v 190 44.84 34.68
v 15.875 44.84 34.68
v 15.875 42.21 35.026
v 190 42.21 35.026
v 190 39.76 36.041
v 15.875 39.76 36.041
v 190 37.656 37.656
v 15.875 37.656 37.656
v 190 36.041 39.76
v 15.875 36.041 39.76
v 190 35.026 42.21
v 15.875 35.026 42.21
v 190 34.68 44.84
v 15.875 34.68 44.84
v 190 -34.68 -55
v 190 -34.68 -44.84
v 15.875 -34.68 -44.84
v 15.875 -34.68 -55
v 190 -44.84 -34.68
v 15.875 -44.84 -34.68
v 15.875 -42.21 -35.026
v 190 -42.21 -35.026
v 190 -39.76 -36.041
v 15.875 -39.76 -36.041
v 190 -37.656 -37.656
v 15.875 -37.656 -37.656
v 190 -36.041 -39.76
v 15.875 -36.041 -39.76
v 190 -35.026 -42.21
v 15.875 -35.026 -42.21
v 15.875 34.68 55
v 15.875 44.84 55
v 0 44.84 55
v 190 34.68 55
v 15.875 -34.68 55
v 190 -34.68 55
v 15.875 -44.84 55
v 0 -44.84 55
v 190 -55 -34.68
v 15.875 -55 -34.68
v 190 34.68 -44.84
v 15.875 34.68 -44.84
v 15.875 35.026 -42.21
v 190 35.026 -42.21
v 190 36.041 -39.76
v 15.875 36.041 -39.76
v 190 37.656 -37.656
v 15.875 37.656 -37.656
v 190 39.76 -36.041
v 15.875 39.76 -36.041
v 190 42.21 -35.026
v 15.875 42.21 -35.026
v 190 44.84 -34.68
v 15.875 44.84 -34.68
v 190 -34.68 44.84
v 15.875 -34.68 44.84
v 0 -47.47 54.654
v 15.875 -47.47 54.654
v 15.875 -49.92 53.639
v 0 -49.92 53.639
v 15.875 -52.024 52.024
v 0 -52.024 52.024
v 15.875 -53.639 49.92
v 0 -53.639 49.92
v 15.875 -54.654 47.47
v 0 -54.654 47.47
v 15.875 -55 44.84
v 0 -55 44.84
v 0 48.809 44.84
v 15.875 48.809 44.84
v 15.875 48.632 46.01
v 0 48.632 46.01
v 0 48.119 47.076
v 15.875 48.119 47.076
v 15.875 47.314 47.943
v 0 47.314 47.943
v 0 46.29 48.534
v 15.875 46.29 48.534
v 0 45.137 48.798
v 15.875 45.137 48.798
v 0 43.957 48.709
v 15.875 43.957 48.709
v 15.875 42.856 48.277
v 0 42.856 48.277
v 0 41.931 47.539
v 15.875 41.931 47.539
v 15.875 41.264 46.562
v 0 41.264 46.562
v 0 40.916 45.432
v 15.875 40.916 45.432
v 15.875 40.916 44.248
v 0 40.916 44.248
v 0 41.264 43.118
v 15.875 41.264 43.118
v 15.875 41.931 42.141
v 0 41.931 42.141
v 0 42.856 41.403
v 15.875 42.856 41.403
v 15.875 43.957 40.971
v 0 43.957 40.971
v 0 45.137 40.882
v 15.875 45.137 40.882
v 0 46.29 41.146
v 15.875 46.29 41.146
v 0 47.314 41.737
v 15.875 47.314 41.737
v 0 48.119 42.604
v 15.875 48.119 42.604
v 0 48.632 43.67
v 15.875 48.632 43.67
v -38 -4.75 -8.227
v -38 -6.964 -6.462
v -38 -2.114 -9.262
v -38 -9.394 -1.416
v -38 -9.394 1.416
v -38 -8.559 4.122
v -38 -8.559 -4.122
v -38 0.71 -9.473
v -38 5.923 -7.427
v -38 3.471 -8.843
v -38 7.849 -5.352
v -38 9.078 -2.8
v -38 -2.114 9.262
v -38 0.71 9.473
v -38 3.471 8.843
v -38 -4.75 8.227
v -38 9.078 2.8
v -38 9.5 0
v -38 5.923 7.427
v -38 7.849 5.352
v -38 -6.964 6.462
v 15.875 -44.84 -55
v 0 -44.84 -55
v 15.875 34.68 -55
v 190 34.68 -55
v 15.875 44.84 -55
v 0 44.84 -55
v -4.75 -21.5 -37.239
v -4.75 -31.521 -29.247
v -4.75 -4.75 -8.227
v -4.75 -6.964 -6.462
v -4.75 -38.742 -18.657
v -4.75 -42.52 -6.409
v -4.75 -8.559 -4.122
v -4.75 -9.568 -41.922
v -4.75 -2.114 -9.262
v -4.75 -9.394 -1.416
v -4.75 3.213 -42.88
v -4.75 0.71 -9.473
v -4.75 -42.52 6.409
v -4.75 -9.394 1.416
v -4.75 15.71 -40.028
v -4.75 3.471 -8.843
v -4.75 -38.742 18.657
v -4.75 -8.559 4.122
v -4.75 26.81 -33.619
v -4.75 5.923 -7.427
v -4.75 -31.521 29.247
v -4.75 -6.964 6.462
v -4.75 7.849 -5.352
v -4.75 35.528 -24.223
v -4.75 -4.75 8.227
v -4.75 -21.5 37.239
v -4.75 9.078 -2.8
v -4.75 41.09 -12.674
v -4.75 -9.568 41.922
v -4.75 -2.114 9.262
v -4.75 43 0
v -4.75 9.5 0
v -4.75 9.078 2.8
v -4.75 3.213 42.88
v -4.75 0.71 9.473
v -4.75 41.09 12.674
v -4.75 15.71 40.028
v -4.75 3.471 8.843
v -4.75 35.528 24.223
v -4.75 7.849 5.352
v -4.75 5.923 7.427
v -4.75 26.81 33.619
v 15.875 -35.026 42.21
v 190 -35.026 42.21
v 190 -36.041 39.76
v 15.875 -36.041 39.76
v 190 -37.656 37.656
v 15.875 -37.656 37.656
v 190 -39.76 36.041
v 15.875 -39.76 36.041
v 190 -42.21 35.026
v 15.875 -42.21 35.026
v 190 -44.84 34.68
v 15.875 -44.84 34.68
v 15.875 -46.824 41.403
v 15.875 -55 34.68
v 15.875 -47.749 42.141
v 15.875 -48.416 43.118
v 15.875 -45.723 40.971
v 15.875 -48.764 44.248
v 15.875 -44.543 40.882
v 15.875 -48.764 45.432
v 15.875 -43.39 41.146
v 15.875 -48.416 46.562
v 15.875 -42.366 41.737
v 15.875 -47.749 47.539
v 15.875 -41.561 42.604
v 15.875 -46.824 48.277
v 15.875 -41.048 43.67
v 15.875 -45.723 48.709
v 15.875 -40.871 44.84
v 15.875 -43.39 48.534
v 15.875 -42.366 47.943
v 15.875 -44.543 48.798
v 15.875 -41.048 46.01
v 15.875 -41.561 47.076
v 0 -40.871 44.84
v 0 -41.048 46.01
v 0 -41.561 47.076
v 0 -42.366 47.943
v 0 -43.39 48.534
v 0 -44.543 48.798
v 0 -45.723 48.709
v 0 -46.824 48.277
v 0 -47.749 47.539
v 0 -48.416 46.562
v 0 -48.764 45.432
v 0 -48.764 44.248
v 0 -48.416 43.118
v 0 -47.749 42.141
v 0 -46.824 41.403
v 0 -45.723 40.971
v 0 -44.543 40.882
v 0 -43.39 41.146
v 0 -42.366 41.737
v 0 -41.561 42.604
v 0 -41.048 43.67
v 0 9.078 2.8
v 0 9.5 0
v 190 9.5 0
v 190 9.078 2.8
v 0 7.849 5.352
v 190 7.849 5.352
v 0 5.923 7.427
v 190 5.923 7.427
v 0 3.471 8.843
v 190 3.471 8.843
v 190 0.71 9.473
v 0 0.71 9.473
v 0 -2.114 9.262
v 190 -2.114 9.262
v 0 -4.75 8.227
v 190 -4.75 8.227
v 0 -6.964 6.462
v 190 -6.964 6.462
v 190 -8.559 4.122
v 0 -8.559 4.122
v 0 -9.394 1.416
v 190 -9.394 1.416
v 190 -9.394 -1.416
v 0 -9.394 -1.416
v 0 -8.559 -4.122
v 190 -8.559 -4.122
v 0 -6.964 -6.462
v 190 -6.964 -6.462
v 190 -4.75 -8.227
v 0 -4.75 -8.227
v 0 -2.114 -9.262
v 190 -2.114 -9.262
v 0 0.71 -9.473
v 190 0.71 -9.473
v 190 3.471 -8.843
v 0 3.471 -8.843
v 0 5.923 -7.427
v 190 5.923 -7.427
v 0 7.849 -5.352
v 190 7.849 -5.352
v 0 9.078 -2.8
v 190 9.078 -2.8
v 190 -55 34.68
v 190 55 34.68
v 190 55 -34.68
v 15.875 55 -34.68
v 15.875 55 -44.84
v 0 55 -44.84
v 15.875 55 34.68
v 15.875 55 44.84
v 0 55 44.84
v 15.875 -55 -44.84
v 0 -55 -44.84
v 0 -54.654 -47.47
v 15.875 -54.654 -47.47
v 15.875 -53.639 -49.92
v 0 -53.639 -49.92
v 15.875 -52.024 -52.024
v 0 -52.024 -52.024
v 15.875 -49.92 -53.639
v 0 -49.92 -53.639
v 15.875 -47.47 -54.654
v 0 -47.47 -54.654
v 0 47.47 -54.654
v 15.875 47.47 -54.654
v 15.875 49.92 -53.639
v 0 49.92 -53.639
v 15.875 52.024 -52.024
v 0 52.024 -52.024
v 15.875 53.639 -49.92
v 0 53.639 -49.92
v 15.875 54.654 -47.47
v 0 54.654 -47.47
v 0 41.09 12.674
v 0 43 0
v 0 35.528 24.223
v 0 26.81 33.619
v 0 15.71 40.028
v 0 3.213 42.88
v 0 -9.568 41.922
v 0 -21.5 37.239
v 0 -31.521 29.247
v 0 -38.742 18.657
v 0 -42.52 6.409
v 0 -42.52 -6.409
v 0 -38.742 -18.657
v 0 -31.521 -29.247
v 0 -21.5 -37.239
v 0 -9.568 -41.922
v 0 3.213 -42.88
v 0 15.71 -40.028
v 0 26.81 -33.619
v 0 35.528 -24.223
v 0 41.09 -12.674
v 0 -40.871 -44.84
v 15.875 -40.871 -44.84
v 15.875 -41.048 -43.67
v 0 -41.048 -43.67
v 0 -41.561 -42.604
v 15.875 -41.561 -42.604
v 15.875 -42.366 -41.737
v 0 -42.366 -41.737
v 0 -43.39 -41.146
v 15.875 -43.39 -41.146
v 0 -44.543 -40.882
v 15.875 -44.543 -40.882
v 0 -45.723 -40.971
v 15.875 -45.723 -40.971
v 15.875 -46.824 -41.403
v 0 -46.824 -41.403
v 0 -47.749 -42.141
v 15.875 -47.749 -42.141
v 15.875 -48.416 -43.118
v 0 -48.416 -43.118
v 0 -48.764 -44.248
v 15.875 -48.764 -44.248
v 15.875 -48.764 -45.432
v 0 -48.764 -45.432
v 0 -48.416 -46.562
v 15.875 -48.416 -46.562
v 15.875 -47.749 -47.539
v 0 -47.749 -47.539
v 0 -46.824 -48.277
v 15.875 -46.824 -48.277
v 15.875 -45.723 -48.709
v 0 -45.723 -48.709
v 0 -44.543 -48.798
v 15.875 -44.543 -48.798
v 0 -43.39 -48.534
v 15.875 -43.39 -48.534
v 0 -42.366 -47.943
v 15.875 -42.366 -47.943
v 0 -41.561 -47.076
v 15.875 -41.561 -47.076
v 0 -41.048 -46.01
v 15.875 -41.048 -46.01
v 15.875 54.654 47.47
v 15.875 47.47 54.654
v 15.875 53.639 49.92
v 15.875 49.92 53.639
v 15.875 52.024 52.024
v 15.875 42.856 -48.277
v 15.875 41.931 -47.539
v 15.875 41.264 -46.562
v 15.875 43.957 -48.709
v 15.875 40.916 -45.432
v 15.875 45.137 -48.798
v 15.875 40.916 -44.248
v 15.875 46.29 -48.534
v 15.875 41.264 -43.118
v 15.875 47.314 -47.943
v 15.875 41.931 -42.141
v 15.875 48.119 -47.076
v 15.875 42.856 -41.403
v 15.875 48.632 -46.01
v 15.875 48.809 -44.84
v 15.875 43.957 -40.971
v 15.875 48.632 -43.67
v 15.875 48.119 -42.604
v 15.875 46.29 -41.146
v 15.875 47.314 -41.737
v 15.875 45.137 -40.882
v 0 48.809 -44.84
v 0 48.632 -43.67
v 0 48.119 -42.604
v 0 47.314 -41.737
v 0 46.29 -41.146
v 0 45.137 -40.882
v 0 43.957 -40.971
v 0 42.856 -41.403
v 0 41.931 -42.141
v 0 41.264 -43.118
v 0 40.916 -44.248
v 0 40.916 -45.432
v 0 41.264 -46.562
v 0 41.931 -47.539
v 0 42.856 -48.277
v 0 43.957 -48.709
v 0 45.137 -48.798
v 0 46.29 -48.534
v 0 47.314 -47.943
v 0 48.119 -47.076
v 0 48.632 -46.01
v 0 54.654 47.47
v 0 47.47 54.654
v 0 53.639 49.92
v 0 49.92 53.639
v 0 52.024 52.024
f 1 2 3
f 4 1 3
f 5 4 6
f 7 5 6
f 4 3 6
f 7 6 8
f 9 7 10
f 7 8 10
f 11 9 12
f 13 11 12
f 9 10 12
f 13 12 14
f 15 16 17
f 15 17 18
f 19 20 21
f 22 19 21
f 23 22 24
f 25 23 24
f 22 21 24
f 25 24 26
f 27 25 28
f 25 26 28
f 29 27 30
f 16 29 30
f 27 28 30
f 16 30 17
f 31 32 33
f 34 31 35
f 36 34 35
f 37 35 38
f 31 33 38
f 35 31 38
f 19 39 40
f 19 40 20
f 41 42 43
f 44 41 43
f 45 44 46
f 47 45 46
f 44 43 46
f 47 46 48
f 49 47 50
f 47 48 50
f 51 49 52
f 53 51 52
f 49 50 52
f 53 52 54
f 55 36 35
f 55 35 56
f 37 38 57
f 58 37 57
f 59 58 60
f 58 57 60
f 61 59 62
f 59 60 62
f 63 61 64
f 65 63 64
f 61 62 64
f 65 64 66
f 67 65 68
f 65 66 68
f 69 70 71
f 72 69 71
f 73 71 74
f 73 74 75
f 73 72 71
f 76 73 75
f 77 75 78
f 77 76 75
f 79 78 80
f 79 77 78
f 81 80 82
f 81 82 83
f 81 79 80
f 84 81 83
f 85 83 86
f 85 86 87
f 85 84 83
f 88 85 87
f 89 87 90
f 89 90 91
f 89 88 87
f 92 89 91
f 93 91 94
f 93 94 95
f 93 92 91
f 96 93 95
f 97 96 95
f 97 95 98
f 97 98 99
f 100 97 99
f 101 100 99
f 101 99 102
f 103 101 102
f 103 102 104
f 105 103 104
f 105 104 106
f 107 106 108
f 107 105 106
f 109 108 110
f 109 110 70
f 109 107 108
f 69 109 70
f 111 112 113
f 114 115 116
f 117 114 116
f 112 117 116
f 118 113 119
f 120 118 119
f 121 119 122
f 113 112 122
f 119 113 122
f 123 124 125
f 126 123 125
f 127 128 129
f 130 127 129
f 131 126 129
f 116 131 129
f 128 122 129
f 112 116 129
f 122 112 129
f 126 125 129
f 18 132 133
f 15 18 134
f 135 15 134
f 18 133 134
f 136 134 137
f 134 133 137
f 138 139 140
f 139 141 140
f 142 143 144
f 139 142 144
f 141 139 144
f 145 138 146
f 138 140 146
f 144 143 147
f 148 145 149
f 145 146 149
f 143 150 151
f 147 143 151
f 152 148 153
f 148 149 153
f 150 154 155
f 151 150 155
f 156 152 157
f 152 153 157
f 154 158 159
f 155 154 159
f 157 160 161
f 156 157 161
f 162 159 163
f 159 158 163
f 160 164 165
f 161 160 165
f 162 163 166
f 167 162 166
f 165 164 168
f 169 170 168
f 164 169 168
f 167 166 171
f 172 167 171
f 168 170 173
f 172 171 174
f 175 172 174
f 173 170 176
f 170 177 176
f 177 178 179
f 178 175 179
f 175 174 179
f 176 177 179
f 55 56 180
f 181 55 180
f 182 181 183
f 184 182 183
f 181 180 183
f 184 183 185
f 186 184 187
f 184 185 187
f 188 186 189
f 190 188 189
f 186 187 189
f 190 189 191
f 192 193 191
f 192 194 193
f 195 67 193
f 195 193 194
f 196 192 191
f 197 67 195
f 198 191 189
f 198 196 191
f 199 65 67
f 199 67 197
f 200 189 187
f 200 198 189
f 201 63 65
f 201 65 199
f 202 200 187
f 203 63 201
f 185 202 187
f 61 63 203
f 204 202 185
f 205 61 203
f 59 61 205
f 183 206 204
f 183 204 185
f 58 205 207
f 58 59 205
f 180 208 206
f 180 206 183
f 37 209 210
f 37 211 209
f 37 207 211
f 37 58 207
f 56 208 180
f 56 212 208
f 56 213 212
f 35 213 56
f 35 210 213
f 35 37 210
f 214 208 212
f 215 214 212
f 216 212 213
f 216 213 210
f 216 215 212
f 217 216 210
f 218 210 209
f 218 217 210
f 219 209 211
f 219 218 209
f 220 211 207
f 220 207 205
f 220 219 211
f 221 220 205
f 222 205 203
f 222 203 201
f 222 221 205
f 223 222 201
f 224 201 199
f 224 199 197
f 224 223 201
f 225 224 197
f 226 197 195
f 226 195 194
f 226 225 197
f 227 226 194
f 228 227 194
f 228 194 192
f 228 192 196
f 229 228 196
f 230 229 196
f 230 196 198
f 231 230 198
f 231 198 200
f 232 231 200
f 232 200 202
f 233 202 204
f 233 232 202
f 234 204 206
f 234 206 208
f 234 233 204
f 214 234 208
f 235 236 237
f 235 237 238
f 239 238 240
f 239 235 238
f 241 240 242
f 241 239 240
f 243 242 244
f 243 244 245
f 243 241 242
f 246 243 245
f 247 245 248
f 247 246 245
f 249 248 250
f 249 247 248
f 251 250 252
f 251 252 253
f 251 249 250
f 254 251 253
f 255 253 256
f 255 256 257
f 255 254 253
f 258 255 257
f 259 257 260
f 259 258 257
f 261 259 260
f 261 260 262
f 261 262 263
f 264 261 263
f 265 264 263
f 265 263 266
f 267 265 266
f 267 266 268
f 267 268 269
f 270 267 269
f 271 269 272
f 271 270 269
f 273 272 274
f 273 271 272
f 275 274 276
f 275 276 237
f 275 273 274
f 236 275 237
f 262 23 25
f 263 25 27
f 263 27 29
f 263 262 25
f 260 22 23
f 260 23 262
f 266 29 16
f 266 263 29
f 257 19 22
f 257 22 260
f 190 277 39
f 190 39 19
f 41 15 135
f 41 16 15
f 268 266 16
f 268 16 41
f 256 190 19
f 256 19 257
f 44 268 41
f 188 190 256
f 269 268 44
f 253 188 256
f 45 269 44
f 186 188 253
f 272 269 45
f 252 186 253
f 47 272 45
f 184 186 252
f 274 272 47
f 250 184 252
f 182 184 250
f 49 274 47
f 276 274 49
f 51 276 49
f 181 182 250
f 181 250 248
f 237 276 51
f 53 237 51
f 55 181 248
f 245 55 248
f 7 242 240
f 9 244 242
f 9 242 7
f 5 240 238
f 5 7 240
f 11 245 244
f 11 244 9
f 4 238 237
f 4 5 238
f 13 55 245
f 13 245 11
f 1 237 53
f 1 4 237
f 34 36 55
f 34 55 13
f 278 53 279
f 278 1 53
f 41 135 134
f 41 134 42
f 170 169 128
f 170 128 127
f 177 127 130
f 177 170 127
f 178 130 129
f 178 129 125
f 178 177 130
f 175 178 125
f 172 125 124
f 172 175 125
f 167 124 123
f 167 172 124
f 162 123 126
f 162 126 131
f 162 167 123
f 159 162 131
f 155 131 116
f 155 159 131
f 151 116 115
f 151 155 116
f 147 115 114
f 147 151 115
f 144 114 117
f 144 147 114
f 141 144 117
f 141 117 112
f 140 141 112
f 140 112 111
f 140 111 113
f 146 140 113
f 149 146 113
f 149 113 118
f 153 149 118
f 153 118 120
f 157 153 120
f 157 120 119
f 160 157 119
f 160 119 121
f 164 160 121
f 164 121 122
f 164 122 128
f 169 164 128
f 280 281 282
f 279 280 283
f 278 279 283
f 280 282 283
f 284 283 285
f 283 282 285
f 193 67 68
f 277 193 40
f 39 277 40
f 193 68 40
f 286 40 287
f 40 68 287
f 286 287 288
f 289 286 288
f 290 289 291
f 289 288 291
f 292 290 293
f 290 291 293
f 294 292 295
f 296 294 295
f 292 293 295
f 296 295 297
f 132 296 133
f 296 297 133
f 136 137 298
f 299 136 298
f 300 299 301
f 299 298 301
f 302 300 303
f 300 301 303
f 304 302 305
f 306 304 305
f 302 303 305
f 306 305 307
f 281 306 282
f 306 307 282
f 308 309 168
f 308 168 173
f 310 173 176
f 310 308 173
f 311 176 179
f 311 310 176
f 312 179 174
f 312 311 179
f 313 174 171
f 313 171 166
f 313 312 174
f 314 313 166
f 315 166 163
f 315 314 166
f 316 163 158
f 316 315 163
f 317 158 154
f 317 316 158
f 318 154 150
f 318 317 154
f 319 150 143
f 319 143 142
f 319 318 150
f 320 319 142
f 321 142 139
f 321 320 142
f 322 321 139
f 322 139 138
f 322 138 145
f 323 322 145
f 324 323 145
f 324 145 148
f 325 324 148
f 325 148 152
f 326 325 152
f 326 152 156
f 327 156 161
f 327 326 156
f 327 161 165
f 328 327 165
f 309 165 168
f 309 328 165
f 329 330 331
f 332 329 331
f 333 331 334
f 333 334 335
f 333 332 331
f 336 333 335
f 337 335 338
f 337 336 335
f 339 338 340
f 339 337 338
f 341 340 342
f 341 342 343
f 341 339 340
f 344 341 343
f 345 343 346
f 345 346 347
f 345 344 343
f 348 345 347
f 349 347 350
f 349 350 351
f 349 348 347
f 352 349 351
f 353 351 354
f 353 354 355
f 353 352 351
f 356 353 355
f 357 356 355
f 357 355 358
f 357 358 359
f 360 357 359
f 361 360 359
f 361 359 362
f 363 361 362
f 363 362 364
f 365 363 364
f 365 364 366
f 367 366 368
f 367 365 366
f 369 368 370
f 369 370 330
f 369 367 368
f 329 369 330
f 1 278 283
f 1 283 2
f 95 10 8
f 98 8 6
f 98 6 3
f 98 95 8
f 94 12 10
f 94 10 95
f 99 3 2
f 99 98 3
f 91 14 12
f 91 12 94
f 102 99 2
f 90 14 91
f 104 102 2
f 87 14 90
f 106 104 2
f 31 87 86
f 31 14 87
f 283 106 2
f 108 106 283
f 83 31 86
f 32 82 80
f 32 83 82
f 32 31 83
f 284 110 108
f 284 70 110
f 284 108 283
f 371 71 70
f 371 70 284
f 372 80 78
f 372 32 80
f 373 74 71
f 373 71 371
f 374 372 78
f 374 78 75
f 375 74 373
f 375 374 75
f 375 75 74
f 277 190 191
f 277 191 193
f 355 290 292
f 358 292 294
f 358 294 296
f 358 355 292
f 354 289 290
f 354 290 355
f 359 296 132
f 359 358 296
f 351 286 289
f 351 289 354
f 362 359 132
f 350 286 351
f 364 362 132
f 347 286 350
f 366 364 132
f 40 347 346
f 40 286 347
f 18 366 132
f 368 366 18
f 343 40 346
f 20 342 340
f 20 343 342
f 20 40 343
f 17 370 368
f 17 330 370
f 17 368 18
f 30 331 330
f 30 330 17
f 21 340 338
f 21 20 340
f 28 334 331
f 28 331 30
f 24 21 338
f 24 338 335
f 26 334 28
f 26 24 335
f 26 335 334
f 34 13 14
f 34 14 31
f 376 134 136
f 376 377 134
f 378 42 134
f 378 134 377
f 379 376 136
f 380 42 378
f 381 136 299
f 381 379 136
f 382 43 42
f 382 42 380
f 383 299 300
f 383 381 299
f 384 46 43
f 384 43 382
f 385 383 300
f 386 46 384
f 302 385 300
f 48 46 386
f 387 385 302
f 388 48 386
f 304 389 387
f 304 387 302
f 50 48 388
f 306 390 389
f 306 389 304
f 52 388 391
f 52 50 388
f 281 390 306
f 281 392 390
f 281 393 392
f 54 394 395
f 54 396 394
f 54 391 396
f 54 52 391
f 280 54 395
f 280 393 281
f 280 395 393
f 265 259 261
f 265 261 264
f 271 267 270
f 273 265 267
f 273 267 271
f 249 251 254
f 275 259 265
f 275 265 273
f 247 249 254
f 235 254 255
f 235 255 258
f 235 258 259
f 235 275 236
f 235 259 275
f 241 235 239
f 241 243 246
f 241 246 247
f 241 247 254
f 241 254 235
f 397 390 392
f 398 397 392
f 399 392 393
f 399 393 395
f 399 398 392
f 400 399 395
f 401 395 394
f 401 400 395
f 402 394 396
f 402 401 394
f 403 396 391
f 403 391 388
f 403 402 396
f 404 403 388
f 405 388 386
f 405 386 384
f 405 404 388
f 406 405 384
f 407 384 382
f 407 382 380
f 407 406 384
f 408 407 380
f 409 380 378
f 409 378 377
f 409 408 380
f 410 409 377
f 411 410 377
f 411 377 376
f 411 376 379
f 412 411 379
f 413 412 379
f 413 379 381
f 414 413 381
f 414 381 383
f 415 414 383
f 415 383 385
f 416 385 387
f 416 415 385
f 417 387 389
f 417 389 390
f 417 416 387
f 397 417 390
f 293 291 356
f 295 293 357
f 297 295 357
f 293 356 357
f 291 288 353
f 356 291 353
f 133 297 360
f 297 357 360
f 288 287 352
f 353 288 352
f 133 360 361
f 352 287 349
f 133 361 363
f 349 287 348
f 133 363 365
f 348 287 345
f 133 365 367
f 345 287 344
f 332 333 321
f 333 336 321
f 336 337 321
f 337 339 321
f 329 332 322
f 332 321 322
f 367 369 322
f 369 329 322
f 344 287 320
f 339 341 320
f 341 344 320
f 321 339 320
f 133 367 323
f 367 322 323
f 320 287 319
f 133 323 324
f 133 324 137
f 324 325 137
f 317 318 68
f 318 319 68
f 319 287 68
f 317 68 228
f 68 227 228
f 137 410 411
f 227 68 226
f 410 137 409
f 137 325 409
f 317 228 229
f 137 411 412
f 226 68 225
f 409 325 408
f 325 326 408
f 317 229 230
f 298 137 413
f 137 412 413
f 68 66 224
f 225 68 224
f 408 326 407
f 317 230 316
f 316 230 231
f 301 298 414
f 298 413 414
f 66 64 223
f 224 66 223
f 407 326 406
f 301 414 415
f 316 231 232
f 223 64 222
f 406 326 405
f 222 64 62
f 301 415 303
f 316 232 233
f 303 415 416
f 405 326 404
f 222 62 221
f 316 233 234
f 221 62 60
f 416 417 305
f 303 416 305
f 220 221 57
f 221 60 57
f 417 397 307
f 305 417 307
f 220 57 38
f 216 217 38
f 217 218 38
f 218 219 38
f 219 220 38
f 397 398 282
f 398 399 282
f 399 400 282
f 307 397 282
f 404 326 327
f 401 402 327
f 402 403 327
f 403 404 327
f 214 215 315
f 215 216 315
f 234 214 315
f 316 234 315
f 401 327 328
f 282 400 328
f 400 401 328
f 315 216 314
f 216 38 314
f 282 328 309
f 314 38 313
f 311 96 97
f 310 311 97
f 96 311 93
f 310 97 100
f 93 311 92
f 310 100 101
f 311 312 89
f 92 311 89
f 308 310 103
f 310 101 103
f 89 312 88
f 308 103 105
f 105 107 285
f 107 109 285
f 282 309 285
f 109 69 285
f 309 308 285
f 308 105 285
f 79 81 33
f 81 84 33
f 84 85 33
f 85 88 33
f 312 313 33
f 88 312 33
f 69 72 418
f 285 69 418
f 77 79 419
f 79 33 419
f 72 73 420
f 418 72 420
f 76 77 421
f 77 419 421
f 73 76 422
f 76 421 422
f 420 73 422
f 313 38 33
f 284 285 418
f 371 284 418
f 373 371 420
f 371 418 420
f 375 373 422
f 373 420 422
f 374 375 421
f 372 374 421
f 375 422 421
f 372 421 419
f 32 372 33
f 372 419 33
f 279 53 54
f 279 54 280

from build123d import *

# Parameters (mm, degrees)
F0_R     = 9.5
F1_DEPTH = 38
F0_R_2   = 43
F2_DEPTH = 4.75
F3_DEPTH = 190
F0_R_3   = 3.96875
F4_DEPTH = 15.875


with BuildPart() as f1:
    # F0 (on Right) → F1 (new body)
    with BuildSketch(Plane.YZ):
        Circle(F0_R)
    extrude(amount=-F1_DEPTH)

    # F0 (on Right) → F2 (join)
    with BuildSketch(Plane.YZ):
        Circle(F0_R_2)
        Circle(F0_R, mode=Mode.SUBTRACT)
    extrude(amount=-F2_DEPTH)

    # F0 (on Right) → F3 (join)
    with BuildSketch(Plane.YZ):
        with BuildLine():
            Line((-34.68, -55), (34.68, -55))
            Line((34.68, -55), (34.68, -44.84))
            ThreePointArc((34.68, -44.84), (37.6557951031, -37.6557951031), (44.84, -34.68))
            Line((44.84, -34.68), (55, -34.68))
            Line((55, -34.68), (55, 34.68))
            Line((55, 34.68), (44.84, 34.68))
            ThreePointArc((44.84, 34.68), (37.6557951031, 37.6557951031), (34.68, 44.84))
            Line((34.68, 44.84), (34.68, 55))
            Line((34.68, 55), (-34.68, 55))
            Line((-34.68, 55), (-34.68, 44.84))
            ThreePointArc((-34.68, 44.84), (-37.6557951031, 37.6557951031), (-44.84, 34.68))
            Line((-44.84, 34.68), (-55, 34.68))
            Line((-55, 34.68), (-55, -34.68))
            Line((-55, -34.68), (-44.84, -34.68))
            ThreePointArc((-44.84, -34.68), (-37.6557951031, -37.6557951031), (-34.68, -44.84))
            Line((-34.68, -44.84), (-34.68, -55))
        make_face()
        Circle(F0_R_2, mode=Mode.SUBTRACT)
        Circle(F0_R_2)
        Circle(F0_R, mode=Mode.SUBTRACT)
    extrude(amount=F3_DEPTH)

    # F0 (on Right) → F4 (join)
    with BuildSketch(Plane.YZ):
        with BuildLine():
            Line((-55, 44.84), (-55, 34.68))
            Line((-55, 34.68), (-44.84, 34.68))
            ThreePointArc((-44.84, 34.68), (-37.6557951031, 37.6557951031), (-34.68, 44.84))
            Line((-34.68, 44.84), (-34.68, 55))
            Line((-34.68, 55), (-44.84, 55))
            ThreePointArc((-44.84, 55), (-52.0242048969, 52.0242048969), (-55, 44.84))
        make_face()
        with Locations((-44.84, 44.84)):
            Circle(F0_R_3, mode=Mode.SUBTRACT)
        with BuildLine():
            Line((44.84, 34.68), (55, 34.68))
            Line((55, 34.68), (55, 44.84))
            ThreePointArc((55, 44.84), (52.0242048969, 52.0242048969), (44.84, 55))
            Line((44.84, 55), (34.68, 55))
            Line((34.68, 55), (34.68, 44.84))
            ThreePointArc((34.68, 44.84), (37.6557951031, 37.6557951031), (44.84, 34.68))
        make_face()
        with Locations((44.84, 44.84)):
            Circle(F0_R_3, mode=Mode.SUBTRACT)
        with BuildLine():
            Line((34.68, -55), (44.84, -55))
            ThreePointArc((44.84, -55), (52.0242048969, -52.0242048969), (55, -44.84))
            Line((55, -44.84), (55, -34.68))
            Line((55, -34.68), (44.84, -34.68))
            ThreePointArc((44.84, -34.68), (37.6557951031, -37.6557951031), (34.68, -44.84))
            Line((34.68, -44.84), (34.68, -55))
        make_face()
        with Locations((44.84, -44.84)):
            Circle(F0_R_3, mode=Mode.SUBTRACT)
        with BuildLine():
            Line((-44.84, -55), (-34.68, -55))
            Line((-34.68, -55), (-34.68, -44.84))
            ThreePointArc((-34.68, -44.84), (-37.6557951031, -37.6557951031), (-44.84, -34.68))
            Line((-44.84, -34.68), (-55, -34.68))
            Line((-55, -34.68), (-55, -44.84))
            ThreePointArc((-55, -44.84), (-52.0242048969, -52.0242048969), (-44.84, -55))
        make_face()
        with Locations((-44.84, -44.84)):
            Circle(F0_R_3, mode=Mode.SUBTRACT)
    extrude(amount=F4_DEPTH)


solid = f1.part
